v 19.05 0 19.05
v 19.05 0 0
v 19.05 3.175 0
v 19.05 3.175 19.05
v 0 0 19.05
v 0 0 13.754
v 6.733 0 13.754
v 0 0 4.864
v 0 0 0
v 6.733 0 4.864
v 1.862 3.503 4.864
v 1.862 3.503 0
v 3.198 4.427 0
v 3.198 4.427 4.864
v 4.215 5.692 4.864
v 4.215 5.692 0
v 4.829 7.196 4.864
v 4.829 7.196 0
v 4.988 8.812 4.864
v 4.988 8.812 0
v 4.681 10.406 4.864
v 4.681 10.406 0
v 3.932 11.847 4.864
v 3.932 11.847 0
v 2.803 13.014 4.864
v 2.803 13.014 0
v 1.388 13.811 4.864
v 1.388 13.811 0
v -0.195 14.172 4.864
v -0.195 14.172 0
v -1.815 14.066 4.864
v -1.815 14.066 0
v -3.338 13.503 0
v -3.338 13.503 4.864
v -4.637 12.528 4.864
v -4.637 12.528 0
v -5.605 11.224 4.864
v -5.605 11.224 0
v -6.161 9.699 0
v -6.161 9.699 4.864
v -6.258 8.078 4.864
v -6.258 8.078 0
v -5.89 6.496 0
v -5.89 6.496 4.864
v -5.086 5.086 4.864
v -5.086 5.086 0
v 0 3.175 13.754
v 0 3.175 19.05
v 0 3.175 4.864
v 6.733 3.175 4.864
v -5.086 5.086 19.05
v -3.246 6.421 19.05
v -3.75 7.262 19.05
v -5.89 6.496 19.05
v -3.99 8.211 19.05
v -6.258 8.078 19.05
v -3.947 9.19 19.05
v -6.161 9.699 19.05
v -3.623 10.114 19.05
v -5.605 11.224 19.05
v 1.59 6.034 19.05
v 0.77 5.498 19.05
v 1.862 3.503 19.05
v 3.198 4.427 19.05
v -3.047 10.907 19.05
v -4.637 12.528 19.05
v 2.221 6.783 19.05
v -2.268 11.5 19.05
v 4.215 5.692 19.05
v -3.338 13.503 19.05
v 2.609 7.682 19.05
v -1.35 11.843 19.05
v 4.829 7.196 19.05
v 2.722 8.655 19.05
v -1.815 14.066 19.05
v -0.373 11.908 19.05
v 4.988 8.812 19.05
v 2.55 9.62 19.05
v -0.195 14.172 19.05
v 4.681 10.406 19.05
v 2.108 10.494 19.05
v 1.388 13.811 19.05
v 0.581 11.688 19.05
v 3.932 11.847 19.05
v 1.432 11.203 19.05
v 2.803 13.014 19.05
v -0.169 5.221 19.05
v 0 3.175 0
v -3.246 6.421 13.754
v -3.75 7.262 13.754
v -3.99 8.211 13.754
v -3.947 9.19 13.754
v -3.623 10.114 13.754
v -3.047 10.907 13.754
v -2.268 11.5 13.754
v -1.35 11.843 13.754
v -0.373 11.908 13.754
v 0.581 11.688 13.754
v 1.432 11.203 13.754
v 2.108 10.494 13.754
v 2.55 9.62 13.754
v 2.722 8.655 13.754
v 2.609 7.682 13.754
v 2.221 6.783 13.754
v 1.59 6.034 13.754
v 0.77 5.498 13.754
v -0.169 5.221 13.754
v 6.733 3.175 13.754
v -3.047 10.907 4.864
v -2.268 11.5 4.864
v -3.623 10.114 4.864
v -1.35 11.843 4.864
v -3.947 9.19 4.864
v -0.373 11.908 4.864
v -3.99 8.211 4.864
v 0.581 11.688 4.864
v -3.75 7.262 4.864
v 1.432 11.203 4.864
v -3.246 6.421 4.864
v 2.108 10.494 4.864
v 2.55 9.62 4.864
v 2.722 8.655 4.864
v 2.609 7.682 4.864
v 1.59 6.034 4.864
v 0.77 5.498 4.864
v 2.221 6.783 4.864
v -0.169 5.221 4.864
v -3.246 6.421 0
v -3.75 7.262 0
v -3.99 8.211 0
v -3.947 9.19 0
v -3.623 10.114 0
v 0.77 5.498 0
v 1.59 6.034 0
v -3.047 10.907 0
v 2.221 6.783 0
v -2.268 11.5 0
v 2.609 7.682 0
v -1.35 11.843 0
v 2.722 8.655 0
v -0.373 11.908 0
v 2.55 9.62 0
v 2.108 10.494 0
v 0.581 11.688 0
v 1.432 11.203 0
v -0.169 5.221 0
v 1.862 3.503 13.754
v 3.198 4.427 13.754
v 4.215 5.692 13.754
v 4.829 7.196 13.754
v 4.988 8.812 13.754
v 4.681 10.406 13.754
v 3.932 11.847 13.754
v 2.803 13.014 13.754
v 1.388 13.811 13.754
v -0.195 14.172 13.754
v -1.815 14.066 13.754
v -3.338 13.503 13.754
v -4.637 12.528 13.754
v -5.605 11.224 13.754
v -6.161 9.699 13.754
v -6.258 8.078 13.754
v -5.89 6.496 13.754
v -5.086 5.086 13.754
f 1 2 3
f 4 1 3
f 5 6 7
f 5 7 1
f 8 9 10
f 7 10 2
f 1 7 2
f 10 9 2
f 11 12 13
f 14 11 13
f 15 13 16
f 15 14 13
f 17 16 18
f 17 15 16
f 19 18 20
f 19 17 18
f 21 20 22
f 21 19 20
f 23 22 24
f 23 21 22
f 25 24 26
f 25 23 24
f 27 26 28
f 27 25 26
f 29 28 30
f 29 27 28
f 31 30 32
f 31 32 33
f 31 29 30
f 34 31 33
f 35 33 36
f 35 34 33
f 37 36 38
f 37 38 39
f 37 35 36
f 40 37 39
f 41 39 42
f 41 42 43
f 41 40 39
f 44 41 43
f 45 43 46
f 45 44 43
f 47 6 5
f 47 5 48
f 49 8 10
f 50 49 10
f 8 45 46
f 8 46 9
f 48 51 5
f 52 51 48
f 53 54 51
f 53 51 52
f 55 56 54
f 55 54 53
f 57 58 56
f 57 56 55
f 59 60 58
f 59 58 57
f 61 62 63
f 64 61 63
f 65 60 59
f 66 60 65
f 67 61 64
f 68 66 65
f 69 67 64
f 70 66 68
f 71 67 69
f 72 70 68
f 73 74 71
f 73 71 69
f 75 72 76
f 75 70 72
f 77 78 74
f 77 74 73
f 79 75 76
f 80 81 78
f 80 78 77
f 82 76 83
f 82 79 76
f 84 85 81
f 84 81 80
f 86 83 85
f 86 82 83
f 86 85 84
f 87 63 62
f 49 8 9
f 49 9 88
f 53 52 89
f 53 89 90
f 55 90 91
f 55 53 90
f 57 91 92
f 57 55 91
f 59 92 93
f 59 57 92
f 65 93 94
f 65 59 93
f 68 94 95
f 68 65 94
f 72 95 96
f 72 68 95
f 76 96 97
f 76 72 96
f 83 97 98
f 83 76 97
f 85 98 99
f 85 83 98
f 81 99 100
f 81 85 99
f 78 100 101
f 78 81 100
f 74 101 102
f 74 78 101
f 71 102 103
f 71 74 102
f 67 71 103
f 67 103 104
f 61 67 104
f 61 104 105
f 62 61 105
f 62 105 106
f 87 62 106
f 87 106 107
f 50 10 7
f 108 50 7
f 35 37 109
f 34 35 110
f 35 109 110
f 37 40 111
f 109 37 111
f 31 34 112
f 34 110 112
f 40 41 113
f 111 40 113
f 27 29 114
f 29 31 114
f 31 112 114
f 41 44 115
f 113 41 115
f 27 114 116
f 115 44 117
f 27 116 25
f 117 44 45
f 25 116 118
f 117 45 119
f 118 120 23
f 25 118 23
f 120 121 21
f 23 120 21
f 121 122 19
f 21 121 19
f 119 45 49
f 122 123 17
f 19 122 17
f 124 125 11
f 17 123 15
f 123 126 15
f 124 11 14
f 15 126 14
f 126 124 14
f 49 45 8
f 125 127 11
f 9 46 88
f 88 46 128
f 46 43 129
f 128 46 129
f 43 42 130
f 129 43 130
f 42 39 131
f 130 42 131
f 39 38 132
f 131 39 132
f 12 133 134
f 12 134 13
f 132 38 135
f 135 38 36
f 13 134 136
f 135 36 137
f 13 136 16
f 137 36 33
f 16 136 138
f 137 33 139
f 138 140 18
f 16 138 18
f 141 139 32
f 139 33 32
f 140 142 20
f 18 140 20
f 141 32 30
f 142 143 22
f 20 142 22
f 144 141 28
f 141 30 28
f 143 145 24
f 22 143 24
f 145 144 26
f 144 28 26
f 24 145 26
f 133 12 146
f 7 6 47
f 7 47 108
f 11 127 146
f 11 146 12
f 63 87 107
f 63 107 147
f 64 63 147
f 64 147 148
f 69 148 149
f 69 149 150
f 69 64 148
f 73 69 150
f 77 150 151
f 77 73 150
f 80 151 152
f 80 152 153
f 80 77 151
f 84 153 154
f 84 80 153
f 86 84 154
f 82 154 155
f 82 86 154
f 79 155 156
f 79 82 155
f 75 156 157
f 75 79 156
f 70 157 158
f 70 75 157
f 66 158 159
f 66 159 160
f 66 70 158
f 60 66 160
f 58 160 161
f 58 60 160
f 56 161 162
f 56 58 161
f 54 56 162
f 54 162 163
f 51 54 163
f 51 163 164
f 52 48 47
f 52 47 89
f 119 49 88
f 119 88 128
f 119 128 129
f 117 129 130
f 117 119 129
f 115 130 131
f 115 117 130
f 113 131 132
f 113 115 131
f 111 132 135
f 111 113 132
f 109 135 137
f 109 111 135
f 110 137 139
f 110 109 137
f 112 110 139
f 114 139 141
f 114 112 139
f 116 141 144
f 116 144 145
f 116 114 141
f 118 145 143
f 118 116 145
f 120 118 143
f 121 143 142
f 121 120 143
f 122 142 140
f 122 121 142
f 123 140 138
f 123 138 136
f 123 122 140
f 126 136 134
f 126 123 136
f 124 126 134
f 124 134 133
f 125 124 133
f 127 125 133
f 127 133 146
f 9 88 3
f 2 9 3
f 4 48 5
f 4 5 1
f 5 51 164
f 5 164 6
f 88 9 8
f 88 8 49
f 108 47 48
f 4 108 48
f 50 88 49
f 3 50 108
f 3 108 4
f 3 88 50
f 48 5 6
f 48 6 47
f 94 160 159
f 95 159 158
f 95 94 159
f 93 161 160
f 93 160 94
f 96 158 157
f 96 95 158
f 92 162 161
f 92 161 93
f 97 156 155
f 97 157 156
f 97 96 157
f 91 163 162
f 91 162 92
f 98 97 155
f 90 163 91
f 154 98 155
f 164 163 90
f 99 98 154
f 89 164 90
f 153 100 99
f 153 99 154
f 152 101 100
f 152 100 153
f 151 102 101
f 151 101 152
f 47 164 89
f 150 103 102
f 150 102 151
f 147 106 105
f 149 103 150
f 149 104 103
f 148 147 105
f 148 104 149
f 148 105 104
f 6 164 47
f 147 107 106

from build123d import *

# Parameters (mm, degrees)
SKETCH1_W           = 19.05
SKETCH1_H           = 3.175
BOSS_EXTRUDE1_DEPTH = 19.05
BOSS_EXTRUDE2_DEPTH = 19.05
SKETCH3_W           = 14.499116916
SKETCH3_H           = 8.89
CUT_EXTRUDE1_DEPTH  = 19.05


with BuildPart() as part:
    # Sketch1 → Boss-Extrude1 (new body)
    with BuildSketch(Plane.XY):
        with Locations((9.525, 1.5875)):
            Rectangle(SKETCH1_W, SKETCH1_H)
    extrude(amount=BOSS_EXTRUDE1_DEPTH)


with BuildPart() as body_2:
    # Sketch2 → Boss-Extrude2 (new body)
    with BuildSketch(Plane.XY.offset(19.05)):
        with BuildLine():
            Line((0, 3.175), (-3.246475658, 6.421475658))
            ThreePointArc((-3.246475658, 6.421475658), (0.581460119, 11.688175821), (-0.169373011, 5.220759604))
            Line((-0.169373011, 5.220759604), (1.861944145, 3.503263964))
            ThreePointArc((1.861944145, 3.503263964), (0.609751023, 14.048523374), (-5.085681873, 5.085681873))
            Line((-5.085681873, 5.085681873), (0, 0))
            Line((0, 0), (0, 3.175))
        make_face()
    extrude(amount=-BOSS_EXTRUDE2_DEPTH)


with BuildPart() as cut_extrude1_tool:
    # Sketch3 → Cut-Extrude1 (new body)
    with BuildSketch(Plane.XZ):
        with Locations((-0.516235889, 9.3091)):
            Rectangle(SKETCH3_W, SKETCH3_H)
    extrude(amount=-CUT_EXTRUDE1_DEPTH)


with BuildPart() as part_1:
    add(part.part)

    # Cut-Extrude1: cut by cut_extrude1_tool
    add(cut_extrude1_tool.part, mode=Mode.SUBTRACT)


with BuildPart() as body_2_1:
    add(body_2.part)

    # Cut-Extrude1: cut by cut_extrude1_tool
    add(cut_extrude1_tool.part, mode=Mode.SUBTRACT)


solid = Compound([part_1.part, body_2_1.part])
